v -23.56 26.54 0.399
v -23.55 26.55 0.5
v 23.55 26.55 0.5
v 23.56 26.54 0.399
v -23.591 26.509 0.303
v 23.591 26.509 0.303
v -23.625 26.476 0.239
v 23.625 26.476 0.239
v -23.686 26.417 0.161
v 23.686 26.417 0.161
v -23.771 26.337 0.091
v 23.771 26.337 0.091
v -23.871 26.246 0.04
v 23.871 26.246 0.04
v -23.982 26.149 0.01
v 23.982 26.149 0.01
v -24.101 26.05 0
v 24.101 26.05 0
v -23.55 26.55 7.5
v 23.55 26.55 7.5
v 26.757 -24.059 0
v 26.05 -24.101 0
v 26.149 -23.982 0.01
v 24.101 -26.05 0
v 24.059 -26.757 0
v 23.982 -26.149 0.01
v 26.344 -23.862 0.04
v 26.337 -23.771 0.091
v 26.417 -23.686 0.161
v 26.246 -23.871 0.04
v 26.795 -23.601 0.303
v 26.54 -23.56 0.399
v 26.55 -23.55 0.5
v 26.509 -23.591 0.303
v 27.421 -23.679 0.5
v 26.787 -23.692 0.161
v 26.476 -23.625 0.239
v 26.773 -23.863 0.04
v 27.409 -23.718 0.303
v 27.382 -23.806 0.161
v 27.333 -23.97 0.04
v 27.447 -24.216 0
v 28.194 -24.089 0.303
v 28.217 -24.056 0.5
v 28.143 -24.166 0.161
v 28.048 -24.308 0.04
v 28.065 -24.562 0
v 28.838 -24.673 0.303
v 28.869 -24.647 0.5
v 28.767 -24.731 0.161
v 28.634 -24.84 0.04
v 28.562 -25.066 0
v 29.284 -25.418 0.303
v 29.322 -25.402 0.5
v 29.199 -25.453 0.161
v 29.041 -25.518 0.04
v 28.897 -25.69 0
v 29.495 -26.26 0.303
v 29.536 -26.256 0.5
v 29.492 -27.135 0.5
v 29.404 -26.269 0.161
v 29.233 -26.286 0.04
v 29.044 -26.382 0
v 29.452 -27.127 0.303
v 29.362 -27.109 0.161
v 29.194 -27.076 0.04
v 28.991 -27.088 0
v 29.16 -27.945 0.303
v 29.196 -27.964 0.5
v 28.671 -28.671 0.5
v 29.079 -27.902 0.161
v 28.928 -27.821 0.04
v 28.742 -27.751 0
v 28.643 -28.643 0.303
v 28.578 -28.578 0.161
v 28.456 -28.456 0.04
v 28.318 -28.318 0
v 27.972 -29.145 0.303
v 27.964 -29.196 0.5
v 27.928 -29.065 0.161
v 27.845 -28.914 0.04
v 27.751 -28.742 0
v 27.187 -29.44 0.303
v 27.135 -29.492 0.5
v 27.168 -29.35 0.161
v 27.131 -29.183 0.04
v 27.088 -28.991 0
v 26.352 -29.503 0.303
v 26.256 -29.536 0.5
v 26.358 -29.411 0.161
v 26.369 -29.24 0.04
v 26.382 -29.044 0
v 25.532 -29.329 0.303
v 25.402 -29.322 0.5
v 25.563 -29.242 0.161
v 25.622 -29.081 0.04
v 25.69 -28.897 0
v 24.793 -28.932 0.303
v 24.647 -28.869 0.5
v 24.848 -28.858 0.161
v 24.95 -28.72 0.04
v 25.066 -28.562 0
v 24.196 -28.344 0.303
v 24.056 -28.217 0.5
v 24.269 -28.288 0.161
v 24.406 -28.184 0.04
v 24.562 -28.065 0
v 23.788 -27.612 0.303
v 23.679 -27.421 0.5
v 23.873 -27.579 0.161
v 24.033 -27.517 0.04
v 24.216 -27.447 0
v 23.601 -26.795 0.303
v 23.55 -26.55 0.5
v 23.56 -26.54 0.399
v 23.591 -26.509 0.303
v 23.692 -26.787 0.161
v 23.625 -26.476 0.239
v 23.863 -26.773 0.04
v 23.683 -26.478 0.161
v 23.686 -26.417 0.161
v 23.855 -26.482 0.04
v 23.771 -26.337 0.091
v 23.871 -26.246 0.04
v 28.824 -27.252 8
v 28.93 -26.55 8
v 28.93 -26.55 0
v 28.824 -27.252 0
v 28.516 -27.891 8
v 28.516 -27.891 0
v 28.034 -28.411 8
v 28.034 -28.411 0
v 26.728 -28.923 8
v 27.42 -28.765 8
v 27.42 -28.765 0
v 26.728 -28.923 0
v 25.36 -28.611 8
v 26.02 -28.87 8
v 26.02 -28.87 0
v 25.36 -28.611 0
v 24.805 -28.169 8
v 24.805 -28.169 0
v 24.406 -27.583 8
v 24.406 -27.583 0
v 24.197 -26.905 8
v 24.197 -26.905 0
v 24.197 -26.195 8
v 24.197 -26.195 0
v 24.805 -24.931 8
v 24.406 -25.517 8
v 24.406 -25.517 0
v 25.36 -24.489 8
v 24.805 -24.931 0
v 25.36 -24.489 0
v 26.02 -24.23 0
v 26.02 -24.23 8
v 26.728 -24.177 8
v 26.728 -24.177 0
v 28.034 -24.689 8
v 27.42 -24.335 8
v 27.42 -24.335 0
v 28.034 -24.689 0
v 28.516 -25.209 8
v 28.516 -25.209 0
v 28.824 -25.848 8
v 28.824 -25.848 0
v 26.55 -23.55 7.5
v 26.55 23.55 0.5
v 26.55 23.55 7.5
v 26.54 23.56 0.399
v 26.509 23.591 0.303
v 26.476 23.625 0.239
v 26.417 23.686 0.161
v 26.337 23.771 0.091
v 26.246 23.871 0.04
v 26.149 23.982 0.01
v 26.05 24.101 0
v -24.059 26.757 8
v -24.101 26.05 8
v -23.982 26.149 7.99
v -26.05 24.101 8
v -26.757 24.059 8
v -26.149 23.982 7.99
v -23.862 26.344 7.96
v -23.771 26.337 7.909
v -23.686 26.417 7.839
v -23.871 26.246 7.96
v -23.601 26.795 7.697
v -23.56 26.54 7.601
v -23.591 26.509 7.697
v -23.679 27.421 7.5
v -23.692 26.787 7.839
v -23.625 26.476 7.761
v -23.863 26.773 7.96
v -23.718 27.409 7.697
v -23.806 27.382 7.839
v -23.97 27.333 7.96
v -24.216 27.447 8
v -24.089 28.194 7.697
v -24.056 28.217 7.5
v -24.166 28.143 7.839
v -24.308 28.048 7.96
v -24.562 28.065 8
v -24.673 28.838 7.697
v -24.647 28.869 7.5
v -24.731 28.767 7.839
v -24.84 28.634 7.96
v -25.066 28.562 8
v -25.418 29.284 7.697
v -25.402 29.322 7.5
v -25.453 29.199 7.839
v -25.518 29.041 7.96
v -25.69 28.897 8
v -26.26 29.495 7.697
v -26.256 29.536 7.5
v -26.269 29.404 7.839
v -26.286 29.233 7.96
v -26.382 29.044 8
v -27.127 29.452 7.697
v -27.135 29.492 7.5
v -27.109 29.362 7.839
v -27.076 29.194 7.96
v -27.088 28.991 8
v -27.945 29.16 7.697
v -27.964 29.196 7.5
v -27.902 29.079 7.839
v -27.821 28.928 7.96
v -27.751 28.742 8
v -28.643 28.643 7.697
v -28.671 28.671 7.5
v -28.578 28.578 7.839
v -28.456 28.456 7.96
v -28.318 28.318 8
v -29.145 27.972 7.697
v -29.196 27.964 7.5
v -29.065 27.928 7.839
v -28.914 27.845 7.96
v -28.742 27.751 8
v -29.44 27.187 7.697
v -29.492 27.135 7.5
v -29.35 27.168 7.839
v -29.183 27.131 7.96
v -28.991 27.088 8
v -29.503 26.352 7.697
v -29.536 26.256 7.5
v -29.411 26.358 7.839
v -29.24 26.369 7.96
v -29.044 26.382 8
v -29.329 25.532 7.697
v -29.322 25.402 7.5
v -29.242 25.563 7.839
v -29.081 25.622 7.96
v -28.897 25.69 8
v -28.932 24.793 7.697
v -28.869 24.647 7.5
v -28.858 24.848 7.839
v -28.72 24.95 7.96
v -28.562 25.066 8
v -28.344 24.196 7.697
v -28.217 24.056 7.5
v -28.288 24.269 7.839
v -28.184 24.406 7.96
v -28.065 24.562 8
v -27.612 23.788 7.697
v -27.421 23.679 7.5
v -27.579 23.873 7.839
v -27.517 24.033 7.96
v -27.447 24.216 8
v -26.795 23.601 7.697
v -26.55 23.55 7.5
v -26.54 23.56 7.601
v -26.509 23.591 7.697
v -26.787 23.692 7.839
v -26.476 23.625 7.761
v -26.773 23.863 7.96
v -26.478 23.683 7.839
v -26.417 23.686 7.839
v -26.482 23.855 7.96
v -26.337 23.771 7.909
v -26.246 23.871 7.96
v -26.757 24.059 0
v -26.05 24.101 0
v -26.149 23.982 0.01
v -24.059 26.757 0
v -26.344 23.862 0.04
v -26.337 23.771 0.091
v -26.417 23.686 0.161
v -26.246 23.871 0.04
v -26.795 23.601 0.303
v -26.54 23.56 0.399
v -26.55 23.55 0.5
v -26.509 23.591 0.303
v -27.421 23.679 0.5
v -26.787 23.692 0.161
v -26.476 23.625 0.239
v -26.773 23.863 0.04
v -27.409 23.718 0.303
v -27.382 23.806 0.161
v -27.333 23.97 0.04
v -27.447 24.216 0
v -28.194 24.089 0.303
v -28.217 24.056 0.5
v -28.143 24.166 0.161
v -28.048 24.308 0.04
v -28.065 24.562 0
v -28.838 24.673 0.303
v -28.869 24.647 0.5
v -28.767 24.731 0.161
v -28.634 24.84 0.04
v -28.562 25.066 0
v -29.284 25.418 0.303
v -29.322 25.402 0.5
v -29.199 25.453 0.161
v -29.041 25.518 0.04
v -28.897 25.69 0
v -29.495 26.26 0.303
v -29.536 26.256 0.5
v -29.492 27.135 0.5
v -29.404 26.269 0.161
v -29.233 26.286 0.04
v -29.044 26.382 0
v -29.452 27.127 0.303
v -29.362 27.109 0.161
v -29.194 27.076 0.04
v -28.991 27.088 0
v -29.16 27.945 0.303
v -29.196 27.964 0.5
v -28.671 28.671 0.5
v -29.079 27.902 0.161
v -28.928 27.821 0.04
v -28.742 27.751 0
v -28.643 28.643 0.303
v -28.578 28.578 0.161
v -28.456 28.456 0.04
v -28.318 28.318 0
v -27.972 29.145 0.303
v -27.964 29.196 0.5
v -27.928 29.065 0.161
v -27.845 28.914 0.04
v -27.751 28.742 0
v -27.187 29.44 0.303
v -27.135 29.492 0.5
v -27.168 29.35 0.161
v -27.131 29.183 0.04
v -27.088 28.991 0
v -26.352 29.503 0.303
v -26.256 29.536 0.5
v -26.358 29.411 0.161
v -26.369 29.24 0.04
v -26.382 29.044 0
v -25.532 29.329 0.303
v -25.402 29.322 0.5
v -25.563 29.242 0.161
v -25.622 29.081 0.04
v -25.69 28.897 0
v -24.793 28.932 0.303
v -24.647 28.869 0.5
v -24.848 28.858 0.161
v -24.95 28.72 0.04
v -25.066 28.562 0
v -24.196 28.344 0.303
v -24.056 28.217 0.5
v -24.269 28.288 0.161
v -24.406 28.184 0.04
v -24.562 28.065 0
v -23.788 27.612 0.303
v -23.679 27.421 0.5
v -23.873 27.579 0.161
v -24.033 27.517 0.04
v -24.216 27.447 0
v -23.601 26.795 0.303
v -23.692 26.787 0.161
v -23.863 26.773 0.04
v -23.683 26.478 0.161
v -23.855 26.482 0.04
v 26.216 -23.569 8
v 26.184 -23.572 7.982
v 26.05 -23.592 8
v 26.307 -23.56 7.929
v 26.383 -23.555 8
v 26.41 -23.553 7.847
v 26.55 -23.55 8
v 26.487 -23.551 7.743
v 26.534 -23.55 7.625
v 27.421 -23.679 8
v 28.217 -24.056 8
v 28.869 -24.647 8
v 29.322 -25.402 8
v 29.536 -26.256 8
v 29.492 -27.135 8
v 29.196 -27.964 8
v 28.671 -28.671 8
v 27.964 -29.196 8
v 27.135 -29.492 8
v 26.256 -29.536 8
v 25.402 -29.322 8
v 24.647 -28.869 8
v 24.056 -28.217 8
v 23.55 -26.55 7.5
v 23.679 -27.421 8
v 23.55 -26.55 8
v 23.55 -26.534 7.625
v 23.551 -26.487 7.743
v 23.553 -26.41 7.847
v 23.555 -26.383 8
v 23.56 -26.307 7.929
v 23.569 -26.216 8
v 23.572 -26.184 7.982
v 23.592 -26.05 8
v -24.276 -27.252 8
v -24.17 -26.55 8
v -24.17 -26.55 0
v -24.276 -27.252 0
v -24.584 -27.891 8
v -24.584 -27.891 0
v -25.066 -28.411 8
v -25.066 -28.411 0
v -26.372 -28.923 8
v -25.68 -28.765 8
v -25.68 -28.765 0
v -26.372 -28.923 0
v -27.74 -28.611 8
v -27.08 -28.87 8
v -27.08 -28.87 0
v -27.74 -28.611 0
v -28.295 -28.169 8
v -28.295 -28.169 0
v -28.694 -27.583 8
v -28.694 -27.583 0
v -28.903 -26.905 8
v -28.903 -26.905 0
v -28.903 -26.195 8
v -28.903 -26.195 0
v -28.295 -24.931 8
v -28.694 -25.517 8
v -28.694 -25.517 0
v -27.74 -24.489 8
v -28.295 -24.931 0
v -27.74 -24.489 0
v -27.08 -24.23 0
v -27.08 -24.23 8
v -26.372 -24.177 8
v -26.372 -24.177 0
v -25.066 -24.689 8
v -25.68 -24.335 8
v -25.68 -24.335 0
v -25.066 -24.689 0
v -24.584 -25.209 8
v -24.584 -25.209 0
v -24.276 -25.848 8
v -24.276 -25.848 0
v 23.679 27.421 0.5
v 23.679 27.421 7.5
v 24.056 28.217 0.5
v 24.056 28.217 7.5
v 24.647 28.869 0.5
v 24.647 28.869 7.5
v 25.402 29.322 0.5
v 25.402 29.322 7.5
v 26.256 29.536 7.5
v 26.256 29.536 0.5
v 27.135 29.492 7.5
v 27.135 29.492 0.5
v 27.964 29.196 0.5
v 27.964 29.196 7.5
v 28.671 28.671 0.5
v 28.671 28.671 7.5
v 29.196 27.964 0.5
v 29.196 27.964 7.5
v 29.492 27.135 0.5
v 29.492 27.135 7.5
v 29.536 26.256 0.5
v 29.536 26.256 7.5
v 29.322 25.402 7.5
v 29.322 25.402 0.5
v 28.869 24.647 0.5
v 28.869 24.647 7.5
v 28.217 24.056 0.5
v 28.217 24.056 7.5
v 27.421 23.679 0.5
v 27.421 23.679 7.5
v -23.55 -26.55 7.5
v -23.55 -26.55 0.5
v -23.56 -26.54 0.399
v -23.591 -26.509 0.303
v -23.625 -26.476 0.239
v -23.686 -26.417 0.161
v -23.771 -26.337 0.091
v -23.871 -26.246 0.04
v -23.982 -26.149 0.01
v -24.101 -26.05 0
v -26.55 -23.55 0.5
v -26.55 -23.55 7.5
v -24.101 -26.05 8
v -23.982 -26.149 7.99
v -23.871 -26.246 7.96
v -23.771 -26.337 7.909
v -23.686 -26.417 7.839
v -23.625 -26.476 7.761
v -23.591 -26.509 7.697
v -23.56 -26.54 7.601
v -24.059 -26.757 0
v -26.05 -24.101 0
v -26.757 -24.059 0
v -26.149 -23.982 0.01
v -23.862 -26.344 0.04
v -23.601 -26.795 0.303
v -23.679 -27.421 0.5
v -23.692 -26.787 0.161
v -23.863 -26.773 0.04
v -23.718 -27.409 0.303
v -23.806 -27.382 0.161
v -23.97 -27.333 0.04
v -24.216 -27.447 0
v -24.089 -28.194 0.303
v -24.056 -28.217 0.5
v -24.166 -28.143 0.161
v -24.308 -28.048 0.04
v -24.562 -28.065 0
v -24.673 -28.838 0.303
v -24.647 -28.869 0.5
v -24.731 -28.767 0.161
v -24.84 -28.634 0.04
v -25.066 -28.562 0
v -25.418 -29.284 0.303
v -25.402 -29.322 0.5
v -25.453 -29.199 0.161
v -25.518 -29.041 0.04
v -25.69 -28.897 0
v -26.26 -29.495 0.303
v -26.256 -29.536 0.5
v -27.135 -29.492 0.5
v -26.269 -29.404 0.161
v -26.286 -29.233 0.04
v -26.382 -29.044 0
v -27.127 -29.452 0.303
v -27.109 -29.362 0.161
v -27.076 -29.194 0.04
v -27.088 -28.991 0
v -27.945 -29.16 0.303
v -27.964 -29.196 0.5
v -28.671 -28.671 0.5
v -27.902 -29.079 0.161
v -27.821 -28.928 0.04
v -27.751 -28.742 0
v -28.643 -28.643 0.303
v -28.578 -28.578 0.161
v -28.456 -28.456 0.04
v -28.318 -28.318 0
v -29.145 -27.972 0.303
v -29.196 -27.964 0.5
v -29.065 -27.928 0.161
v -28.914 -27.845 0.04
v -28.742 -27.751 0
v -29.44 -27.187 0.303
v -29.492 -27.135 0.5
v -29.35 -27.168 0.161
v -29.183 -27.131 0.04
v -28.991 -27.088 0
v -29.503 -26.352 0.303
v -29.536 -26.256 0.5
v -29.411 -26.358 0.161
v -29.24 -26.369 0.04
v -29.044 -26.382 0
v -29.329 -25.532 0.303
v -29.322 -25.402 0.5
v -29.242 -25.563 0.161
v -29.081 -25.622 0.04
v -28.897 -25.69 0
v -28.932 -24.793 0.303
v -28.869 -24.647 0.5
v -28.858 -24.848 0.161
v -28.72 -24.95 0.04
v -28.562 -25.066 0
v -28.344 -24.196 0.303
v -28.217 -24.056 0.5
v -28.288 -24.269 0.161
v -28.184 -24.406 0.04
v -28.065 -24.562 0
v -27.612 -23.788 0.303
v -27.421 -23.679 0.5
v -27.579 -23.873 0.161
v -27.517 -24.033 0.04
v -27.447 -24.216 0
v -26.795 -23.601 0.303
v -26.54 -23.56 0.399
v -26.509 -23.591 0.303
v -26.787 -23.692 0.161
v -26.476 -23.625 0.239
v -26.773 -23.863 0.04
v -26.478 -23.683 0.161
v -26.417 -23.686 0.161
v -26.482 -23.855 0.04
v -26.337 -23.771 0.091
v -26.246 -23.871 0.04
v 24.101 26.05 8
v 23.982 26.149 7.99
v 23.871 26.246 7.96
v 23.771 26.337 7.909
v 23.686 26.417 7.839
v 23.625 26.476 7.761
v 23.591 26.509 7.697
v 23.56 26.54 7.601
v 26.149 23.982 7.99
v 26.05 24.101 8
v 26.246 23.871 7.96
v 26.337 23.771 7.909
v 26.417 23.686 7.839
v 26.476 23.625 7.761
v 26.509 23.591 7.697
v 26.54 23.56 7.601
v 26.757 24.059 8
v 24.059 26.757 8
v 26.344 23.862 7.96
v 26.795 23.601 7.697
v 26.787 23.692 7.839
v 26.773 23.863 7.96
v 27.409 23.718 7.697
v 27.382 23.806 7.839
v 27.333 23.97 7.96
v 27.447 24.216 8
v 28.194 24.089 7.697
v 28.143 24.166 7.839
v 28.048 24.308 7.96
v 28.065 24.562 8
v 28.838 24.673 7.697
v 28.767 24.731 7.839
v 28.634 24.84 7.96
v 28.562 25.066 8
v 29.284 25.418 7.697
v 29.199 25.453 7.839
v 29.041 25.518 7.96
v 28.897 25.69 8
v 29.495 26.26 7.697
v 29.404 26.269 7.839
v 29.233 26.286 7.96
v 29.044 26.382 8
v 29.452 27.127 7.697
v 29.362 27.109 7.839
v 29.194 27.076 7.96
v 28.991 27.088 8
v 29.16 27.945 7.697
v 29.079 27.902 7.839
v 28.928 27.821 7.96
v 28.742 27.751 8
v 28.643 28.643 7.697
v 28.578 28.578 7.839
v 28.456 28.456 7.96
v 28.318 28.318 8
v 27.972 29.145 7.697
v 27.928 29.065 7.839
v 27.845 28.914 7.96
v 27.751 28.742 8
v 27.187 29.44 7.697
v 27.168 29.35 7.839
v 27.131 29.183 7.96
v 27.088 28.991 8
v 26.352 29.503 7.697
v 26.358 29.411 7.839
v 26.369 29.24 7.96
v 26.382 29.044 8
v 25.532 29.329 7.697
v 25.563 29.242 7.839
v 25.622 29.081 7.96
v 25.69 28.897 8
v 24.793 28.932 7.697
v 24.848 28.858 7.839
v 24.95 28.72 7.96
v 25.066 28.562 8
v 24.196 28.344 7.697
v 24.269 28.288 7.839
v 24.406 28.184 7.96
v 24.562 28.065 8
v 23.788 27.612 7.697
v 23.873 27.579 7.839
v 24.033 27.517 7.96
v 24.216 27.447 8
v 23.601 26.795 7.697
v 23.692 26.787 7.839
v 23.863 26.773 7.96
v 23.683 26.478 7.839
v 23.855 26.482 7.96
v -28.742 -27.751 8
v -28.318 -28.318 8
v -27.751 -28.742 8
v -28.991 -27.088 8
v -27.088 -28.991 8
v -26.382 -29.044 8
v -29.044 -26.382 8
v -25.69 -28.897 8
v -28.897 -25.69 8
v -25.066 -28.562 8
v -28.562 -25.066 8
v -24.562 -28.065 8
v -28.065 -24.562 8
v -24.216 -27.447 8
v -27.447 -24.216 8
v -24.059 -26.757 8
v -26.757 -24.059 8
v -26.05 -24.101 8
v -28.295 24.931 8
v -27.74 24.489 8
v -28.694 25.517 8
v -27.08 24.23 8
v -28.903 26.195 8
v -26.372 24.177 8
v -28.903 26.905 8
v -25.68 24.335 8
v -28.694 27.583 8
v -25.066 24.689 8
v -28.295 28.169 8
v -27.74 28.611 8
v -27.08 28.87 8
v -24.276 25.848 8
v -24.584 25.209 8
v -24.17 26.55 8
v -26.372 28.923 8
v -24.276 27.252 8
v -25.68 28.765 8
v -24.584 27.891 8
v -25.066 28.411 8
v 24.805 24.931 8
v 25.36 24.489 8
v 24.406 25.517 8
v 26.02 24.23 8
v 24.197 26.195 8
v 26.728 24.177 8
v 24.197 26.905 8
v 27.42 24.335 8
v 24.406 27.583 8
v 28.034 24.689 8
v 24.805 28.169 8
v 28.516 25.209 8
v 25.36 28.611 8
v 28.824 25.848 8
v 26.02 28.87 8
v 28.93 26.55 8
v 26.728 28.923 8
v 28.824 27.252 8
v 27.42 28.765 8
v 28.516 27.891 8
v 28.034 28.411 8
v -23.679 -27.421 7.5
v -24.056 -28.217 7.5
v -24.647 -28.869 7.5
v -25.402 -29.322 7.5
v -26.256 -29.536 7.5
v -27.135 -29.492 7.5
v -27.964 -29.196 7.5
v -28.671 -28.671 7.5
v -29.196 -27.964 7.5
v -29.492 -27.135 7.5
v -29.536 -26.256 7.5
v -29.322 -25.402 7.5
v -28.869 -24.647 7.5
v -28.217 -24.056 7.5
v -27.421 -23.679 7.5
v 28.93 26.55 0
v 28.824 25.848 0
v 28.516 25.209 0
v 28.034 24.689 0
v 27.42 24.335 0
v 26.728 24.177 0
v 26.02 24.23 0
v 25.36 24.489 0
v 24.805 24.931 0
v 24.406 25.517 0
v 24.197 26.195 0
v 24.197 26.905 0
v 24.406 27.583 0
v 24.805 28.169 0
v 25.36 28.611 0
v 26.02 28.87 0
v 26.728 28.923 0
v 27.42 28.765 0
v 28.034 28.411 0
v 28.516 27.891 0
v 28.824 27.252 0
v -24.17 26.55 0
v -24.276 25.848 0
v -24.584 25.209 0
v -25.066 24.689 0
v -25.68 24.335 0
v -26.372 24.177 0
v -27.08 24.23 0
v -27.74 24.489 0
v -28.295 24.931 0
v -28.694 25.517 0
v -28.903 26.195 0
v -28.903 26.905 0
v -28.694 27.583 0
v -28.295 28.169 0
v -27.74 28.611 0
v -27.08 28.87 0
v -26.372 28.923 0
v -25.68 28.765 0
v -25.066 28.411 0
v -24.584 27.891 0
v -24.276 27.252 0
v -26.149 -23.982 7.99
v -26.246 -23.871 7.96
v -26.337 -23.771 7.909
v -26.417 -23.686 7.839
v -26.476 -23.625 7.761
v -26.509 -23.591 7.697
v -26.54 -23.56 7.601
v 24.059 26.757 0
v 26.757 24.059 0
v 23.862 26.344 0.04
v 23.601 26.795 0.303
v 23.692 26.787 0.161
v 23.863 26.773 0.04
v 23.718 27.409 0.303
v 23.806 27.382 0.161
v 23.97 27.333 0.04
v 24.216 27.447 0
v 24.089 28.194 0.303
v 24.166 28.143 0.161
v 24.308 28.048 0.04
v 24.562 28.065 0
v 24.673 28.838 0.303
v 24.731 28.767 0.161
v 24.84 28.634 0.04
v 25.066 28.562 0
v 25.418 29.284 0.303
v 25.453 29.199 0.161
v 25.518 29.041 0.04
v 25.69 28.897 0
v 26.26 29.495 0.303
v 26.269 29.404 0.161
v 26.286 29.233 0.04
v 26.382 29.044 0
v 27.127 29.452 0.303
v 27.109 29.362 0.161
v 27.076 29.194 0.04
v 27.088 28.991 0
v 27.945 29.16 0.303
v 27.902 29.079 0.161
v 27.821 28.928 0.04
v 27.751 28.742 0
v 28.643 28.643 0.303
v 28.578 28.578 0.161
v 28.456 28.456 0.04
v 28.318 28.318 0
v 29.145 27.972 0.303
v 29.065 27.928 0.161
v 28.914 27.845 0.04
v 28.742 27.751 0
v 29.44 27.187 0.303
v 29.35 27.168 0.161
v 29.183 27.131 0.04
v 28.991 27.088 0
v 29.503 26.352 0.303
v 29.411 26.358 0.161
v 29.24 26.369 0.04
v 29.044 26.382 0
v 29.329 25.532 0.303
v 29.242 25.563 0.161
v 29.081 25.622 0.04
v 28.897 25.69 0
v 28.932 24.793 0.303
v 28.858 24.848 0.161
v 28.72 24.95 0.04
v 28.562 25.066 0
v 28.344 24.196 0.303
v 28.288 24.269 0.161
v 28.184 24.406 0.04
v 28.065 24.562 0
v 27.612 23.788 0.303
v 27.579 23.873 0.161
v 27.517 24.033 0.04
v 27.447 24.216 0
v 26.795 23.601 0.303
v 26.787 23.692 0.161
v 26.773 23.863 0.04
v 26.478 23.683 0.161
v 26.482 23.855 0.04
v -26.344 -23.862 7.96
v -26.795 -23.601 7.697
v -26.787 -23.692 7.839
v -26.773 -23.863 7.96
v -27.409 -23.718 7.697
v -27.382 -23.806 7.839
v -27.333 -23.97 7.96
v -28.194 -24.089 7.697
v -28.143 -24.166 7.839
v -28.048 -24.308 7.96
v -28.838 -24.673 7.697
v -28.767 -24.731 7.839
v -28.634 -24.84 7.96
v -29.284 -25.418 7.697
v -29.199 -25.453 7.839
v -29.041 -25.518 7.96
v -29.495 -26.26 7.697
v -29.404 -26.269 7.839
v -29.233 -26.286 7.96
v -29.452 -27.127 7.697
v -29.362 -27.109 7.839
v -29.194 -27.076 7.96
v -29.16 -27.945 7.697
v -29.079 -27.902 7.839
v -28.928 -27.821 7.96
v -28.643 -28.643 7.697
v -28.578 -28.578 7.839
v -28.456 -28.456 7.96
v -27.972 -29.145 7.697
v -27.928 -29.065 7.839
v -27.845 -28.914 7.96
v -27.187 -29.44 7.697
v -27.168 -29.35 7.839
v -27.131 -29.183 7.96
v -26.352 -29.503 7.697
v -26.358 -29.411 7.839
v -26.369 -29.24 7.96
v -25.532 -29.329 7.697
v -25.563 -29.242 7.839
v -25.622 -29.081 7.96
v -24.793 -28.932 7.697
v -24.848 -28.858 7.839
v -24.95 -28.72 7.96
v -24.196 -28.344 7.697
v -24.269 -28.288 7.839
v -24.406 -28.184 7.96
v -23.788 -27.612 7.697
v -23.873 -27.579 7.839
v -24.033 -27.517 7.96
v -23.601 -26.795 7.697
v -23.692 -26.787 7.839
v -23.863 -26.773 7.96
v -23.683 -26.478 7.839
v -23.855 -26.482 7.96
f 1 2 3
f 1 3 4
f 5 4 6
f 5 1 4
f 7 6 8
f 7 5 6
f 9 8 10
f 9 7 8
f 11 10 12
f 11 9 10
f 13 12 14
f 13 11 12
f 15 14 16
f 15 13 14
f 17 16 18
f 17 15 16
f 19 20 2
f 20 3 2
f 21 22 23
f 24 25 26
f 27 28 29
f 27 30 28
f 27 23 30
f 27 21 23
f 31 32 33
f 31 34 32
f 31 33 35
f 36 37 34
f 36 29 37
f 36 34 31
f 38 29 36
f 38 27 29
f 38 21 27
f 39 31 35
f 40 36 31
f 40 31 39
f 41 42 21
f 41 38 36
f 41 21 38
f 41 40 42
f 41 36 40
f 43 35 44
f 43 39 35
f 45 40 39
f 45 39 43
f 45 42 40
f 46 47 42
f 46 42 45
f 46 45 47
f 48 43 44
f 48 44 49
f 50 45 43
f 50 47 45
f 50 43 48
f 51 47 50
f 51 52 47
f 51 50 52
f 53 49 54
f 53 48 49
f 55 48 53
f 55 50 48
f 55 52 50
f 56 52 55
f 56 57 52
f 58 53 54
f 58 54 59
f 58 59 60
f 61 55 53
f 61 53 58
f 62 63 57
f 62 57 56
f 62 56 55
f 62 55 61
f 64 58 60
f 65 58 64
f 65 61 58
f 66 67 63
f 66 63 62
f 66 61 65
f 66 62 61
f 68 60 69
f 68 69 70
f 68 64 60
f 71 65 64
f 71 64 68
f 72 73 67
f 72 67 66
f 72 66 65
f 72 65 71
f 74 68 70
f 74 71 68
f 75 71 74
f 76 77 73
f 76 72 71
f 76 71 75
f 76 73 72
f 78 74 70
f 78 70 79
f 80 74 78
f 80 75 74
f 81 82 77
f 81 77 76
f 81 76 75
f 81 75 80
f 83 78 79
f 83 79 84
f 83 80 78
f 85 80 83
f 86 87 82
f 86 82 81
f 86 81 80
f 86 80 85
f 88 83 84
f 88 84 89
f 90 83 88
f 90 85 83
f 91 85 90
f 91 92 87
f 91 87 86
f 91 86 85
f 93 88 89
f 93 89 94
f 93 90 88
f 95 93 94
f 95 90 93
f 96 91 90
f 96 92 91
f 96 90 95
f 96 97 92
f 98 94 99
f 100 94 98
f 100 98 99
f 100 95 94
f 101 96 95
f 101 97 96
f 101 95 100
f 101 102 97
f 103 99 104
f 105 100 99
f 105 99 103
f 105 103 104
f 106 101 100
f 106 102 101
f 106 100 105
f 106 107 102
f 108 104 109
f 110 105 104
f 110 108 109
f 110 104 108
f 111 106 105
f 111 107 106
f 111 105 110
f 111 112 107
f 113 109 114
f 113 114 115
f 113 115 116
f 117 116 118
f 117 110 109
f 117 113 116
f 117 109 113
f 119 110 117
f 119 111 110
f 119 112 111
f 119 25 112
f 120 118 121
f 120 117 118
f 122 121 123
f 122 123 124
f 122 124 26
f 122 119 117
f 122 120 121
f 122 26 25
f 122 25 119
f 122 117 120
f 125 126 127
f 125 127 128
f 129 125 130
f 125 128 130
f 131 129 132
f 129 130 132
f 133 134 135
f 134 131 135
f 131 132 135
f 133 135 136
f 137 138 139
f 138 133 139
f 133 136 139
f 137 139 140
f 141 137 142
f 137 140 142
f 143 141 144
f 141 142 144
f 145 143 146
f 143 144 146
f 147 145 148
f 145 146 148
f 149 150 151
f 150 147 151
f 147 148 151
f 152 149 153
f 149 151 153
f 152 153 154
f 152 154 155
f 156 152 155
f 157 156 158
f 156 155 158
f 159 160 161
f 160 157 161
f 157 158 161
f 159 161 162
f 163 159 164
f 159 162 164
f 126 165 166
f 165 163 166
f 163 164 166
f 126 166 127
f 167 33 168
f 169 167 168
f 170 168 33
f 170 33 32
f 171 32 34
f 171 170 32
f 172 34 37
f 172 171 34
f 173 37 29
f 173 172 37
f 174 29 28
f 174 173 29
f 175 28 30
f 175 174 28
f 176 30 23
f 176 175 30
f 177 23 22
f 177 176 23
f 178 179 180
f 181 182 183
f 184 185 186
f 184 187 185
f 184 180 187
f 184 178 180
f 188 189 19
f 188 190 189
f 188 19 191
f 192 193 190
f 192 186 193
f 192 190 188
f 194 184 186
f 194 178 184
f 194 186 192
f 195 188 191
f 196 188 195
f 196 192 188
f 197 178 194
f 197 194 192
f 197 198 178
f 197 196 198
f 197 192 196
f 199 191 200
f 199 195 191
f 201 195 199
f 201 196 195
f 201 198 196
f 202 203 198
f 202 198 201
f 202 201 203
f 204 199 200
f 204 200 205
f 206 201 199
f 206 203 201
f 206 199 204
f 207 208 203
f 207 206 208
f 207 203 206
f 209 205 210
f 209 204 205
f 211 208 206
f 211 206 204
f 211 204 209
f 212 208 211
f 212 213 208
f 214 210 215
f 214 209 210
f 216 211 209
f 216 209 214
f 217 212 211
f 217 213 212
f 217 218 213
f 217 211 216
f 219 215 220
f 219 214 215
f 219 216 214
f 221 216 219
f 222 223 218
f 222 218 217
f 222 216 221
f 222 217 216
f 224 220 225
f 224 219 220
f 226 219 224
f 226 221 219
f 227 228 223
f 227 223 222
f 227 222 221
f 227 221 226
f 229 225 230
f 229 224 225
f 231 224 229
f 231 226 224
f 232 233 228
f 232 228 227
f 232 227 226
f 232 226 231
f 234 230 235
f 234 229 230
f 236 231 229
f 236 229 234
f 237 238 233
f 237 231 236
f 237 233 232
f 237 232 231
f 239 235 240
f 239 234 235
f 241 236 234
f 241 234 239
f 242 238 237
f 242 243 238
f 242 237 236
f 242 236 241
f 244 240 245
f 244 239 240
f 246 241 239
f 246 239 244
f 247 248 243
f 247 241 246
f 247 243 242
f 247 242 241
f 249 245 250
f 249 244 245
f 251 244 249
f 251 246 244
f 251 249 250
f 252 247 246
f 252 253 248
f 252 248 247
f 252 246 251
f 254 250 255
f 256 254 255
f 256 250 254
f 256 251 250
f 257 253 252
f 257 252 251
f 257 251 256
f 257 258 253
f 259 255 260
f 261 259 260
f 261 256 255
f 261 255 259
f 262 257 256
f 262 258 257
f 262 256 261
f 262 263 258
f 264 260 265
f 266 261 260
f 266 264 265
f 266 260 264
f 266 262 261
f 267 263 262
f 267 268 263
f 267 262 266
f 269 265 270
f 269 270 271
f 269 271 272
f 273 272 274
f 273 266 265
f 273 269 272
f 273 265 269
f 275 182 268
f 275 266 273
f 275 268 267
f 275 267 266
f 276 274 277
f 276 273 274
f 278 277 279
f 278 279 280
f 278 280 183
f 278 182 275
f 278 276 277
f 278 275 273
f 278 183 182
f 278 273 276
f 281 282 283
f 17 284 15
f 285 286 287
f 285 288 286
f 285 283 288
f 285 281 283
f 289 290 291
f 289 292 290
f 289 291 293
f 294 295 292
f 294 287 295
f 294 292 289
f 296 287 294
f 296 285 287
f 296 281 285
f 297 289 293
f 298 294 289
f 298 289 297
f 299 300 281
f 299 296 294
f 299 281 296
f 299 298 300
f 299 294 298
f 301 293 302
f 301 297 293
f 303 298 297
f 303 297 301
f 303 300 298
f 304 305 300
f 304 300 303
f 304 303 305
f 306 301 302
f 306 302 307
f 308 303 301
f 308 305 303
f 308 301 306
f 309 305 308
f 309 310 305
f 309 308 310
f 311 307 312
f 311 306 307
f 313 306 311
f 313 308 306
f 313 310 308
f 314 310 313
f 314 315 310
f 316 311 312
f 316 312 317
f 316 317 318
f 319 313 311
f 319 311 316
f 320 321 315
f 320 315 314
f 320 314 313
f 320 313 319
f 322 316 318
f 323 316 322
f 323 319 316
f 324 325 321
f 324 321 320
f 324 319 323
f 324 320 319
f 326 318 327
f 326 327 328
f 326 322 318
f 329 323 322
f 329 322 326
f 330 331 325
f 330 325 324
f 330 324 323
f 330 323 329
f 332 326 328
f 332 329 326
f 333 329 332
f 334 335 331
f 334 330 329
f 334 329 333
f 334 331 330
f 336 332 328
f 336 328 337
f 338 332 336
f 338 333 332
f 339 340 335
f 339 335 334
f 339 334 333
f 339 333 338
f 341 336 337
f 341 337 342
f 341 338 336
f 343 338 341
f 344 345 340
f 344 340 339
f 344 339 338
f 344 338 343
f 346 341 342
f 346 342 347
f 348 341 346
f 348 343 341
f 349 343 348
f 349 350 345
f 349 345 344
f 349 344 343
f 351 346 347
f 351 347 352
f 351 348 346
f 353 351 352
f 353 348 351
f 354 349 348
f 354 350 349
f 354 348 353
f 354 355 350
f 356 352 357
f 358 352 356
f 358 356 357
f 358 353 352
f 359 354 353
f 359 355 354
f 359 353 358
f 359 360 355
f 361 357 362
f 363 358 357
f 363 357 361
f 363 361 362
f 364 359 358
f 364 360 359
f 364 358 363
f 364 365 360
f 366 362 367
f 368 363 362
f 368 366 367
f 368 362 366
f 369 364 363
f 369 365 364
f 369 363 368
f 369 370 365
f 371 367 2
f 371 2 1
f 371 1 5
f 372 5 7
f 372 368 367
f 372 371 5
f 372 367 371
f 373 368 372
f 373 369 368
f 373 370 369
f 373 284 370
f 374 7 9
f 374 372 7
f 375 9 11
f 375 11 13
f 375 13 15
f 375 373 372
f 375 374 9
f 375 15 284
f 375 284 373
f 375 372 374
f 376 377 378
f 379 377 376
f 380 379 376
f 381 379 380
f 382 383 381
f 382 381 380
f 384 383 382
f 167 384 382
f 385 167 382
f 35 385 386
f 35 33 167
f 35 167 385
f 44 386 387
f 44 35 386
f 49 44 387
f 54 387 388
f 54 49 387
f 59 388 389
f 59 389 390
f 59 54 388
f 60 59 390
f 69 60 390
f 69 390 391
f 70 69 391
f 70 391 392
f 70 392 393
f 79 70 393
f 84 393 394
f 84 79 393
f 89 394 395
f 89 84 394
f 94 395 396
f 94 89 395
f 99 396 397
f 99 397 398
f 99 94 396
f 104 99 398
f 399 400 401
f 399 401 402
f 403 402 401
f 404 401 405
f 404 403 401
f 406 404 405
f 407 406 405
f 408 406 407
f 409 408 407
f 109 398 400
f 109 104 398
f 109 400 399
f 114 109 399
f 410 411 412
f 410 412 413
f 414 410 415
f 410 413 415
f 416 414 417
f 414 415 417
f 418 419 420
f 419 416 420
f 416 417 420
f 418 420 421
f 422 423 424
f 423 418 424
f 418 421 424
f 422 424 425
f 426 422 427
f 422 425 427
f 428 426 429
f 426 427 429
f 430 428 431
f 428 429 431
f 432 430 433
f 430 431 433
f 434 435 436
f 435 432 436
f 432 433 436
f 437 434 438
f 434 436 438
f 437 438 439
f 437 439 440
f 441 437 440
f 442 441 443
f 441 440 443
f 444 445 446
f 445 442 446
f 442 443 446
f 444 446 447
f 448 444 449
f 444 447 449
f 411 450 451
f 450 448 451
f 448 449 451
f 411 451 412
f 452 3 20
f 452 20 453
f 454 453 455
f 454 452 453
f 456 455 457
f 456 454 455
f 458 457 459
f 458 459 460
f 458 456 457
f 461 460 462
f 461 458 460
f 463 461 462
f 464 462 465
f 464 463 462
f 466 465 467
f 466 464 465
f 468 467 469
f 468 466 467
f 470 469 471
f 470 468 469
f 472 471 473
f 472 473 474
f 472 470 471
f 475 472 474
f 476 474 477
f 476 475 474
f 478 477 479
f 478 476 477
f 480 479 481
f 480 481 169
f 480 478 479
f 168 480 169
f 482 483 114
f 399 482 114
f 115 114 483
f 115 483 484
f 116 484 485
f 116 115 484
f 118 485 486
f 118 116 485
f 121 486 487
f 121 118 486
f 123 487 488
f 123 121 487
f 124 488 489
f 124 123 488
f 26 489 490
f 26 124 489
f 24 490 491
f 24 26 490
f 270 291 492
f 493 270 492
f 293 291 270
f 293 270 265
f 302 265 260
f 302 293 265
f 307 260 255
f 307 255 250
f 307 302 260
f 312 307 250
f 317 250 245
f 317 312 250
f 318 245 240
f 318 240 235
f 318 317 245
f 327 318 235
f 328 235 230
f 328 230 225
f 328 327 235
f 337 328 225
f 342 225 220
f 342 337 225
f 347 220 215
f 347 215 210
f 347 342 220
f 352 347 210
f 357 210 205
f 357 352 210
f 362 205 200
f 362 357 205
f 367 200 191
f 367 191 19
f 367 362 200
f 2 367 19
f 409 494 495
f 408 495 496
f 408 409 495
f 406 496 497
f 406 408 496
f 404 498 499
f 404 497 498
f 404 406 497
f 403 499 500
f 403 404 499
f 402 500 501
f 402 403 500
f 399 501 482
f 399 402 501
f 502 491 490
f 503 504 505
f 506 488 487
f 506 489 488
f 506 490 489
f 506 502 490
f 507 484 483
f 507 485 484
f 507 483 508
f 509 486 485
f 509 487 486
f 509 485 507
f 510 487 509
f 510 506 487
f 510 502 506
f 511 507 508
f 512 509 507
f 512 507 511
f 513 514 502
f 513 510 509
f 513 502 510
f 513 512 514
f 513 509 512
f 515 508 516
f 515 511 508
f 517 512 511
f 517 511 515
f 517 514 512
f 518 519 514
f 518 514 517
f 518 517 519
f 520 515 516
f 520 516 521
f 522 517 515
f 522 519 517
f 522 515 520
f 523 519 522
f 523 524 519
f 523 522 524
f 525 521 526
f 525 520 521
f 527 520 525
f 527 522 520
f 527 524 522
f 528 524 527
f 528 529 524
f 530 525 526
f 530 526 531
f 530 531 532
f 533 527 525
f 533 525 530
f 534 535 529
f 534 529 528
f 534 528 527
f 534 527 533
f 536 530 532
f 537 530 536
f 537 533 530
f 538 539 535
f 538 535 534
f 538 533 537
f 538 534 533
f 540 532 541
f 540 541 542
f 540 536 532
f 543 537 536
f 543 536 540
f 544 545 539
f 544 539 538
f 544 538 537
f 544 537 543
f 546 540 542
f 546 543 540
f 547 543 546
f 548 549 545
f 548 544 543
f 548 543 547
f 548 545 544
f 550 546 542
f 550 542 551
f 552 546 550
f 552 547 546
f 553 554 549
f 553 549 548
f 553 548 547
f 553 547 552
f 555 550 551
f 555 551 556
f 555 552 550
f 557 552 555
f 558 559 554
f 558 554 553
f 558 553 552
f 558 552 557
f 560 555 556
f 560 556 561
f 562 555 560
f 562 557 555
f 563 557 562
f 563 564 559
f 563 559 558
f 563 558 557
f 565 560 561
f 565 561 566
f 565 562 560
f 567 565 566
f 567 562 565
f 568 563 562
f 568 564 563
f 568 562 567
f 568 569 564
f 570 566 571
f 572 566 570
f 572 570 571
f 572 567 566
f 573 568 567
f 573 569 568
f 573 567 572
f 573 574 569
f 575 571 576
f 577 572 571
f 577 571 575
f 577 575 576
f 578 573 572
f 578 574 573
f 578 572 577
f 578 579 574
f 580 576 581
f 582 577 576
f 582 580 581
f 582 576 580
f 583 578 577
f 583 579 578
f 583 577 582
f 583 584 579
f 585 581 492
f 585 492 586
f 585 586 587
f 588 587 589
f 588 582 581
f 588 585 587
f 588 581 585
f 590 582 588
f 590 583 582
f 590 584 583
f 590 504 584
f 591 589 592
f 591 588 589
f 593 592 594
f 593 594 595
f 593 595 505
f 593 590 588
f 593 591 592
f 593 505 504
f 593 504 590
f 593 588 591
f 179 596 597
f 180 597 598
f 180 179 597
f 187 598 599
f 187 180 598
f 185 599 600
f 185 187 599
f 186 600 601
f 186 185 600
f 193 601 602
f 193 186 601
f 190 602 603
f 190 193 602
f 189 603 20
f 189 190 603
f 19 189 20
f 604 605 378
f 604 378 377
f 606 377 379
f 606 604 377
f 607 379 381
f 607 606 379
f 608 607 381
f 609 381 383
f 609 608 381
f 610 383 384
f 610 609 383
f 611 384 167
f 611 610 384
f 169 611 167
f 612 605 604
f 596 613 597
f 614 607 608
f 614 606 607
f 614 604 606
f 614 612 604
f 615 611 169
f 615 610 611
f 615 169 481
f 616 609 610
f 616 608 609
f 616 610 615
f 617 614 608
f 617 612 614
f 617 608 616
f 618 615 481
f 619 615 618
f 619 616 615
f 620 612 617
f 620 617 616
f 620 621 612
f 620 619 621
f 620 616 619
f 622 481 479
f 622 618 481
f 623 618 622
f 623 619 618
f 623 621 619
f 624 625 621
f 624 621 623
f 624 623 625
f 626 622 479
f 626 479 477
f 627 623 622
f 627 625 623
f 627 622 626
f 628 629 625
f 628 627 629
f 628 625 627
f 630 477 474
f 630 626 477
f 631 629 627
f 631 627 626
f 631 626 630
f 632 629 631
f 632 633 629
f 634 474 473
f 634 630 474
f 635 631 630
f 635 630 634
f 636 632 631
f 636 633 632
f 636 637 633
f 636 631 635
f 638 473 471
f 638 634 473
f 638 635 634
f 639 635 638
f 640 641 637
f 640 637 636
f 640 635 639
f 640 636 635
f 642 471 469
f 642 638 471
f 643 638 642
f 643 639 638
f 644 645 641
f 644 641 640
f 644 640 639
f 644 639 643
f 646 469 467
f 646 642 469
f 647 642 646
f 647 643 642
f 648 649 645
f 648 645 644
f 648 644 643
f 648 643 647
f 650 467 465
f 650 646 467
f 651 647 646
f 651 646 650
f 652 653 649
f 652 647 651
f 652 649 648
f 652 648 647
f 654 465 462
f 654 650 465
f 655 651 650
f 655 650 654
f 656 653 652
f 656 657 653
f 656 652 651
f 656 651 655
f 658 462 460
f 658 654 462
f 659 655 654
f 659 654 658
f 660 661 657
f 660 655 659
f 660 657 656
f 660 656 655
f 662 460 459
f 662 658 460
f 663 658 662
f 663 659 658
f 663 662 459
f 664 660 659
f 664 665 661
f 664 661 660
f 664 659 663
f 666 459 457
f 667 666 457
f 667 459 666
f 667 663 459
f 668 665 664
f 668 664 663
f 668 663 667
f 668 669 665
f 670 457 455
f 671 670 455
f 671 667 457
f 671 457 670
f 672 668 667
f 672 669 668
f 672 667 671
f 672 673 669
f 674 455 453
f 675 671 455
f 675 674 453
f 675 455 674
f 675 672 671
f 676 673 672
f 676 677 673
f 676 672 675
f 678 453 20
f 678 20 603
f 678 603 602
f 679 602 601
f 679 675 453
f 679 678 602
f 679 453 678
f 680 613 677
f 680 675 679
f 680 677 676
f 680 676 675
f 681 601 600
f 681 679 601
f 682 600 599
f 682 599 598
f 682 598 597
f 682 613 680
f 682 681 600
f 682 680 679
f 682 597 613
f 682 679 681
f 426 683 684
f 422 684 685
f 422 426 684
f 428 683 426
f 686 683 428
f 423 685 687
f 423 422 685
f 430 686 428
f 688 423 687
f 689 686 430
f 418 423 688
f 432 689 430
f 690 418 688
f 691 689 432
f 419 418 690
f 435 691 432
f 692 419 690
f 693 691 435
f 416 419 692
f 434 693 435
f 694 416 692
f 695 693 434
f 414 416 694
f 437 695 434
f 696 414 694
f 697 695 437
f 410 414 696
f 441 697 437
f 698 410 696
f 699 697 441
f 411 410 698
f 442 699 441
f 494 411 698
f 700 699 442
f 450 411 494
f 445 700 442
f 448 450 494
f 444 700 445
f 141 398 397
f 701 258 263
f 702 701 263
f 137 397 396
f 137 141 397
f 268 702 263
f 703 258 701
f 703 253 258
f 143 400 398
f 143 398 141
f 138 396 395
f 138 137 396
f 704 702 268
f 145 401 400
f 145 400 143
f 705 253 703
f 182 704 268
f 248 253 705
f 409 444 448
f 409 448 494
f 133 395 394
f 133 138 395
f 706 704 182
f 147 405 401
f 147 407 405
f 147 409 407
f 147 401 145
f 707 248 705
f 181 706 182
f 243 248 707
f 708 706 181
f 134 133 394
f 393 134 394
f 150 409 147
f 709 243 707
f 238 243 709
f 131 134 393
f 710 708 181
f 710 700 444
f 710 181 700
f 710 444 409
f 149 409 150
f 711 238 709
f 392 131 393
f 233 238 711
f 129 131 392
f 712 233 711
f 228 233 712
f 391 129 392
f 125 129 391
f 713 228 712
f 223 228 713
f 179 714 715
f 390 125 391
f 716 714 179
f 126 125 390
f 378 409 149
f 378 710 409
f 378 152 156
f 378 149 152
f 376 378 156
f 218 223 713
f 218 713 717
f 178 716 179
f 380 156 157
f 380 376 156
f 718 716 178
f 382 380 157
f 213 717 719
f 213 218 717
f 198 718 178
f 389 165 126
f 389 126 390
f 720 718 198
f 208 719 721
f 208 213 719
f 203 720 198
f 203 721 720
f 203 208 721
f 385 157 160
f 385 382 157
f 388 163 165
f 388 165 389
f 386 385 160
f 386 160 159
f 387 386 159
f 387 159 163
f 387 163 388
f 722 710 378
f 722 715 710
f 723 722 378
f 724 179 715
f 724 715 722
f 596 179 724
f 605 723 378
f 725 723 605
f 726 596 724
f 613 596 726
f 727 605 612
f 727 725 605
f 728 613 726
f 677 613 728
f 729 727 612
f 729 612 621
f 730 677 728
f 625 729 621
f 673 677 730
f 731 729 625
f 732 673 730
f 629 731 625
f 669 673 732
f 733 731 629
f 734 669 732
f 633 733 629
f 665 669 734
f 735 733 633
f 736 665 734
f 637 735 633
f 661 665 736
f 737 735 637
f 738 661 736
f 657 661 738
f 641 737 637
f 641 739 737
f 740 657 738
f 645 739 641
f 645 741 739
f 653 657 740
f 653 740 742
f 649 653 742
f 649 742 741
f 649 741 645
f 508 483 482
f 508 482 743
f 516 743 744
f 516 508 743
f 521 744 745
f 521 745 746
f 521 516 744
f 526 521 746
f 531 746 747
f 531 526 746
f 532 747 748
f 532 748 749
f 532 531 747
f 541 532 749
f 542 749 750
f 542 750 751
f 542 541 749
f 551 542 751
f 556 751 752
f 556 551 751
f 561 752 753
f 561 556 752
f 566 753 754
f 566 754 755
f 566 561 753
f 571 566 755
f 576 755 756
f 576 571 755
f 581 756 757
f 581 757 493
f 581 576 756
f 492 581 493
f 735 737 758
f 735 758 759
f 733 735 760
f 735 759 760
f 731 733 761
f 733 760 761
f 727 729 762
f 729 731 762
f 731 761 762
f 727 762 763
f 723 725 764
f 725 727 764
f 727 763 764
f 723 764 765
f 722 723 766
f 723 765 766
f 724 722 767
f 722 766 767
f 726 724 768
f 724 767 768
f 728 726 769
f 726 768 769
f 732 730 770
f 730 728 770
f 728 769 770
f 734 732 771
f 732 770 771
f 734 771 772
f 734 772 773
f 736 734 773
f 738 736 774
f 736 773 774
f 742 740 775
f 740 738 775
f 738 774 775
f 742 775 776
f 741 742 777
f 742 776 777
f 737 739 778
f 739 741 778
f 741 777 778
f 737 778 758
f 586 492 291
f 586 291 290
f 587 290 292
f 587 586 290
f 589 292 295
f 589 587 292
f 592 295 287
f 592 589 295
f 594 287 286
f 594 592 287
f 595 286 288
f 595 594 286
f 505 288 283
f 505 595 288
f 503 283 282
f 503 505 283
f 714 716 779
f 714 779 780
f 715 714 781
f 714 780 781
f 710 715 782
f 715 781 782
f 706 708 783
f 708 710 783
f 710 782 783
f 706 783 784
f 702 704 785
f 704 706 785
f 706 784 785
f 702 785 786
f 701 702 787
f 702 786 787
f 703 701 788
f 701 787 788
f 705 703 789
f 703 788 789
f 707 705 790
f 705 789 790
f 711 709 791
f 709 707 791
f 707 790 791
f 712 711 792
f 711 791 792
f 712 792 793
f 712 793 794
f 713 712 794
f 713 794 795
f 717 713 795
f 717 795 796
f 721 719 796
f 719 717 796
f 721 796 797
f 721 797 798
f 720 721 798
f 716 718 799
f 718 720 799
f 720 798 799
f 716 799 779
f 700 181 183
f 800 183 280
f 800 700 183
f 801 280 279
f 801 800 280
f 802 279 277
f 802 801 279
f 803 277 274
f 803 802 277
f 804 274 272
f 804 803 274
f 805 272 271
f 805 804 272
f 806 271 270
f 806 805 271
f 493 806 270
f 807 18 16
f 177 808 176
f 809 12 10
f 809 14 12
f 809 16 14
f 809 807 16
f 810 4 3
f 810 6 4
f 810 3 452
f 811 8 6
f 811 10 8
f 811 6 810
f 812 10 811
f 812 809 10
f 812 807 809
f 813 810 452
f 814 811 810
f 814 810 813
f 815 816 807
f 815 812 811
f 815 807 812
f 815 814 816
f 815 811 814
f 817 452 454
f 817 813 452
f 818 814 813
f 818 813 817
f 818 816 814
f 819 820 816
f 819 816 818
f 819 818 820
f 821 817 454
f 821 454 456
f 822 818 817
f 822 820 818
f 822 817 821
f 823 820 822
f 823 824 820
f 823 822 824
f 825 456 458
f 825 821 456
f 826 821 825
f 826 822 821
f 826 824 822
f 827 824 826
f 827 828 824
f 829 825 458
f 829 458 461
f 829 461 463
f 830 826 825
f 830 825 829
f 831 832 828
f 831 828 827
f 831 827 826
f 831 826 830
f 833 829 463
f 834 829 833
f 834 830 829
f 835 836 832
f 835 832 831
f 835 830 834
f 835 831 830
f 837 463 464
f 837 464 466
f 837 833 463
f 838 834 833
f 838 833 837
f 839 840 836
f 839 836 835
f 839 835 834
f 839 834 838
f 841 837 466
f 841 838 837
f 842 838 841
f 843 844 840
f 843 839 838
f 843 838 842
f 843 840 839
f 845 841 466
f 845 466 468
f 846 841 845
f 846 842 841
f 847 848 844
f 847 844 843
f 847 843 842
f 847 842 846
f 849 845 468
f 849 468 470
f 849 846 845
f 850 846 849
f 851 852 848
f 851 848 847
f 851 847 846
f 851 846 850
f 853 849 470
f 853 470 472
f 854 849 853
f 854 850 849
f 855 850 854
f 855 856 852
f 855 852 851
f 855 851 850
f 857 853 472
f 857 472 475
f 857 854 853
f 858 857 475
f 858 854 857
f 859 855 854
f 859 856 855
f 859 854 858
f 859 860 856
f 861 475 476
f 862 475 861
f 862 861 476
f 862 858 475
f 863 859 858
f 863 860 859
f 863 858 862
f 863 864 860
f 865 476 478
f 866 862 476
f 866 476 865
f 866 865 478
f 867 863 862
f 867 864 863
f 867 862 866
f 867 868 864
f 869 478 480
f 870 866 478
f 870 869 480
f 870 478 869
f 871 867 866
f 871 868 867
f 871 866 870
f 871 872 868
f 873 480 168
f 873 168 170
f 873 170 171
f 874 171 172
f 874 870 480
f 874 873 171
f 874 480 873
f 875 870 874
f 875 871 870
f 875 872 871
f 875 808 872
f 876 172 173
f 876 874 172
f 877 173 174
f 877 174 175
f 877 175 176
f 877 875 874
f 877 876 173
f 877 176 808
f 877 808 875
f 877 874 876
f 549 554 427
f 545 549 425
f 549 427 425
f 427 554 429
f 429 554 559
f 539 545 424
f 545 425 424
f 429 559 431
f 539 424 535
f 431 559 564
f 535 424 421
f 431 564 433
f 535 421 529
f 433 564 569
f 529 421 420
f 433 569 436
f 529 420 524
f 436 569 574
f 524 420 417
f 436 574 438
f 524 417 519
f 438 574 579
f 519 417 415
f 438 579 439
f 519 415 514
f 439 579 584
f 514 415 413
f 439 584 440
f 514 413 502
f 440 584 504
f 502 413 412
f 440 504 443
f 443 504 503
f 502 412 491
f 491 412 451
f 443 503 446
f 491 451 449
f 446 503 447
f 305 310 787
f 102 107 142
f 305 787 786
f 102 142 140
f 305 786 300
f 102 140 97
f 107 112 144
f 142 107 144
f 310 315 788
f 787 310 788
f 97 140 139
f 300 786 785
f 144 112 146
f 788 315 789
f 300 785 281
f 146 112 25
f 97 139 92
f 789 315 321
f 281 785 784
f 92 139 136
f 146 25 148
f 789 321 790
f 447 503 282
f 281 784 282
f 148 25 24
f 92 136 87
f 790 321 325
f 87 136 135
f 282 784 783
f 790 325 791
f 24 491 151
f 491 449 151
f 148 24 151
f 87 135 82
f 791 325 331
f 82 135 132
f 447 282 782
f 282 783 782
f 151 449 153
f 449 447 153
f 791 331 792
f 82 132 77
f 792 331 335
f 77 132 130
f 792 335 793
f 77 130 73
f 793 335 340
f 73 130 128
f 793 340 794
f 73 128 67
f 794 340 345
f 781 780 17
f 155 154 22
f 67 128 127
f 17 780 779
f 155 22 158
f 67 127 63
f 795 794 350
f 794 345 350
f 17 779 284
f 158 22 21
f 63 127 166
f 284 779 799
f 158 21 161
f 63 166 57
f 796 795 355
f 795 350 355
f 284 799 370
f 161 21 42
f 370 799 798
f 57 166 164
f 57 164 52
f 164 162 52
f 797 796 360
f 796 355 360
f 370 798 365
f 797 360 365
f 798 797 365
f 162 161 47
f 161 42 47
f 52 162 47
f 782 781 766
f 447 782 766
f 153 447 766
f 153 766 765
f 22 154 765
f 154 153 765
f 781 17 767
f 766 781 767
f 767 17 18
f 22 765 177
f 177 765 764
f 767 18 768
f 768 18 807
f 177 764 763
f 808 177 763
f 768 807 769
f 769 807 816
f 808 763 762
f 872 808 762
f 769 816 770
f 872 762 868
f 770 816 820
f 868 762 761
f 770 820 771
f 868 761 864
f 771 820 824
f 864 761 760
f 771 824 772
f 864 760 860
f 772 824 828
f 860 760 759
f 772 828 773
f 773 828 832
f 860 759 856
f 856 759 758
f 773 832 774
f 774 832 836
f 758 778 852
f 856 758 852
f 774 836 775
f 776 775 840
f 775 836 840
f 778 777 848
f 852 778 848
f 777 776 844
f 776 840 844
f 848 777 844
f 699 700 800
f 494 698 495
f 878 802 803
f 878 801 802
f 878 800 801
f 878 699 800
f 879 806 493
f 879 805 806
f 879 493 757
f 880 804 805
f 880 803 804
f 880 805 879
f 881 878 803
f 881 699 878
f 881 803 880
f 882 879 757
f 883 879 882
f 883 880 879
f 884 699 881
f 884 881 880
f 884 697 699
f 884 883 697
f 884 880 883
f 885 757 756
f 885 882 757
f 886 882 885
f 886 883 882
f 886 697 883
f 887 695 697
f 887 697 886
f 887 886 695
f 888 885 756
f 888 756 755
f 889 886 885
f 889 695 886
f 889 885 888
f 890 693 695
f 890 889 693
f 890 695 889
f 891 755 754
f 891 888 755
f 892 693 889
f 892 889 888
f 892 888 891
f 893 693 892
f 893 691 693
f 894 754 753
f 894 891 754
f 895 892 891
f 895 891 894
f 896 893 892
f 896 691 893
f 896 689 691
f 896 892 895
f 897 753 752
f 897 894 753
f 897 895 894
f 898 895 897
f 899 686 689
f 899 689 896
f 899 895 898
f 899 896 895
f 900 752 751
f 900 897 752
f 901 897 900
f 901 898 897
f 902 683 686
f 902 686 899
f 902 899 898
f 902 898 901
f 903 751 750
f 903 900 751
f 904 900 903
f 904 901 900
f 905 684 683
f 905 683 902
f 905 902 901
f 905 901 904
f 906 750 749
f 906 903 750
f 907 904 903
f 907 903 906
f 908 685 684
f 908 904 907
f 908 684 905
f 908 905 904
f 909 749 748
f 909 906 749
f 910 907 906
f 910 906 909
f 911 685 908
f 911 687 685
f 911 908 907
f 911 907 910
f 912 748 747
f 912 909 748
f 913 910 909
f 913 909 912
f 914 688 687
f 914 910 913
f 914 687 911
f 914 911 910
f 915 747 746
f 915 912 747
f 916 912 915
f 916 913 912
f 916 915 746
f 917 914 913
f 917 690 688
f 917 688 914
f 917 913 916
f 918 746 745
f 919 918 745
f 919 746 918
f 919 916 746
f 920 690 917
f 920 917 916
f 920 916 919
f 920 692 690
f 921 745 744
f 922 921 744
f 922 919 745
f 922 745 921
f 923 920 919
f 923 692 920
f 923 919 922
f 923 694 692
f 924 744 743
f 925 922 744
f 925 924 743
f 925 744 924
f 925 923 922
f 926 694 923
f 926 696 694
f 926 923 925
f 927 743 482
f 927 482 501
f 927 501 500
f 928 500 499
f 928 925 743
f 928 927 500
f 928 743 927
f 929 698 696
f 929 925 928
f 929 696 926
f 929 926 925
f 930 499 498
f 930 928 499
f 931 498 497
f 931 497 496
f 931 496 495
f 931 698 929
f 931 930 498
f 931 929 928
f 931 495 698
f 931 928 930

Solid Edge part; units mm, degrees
sketch "Sketch1" plane through (0, 0, 0) normal (0, 0, 1) x (1, 0, 0)
  line L0 (-26.55, 23.55) -> (-26.55, -23.55)
  line L1 (-23.55, -26.55) -> (23.55, -26.55)
  line L2 (26.55, -23.55) -> (26.55, 23.55)
  line L3 (23.55, 26.55) -> (-23.55, 26.55)
  arc A0 (-23.55, -26.55) -> (-26.55, -23.55) centre (-26.55, -26.55) cw
  arc A1 (26.55, -23.55) -> (23.55, -26.55) centre (26.55, -26.55) cw
  arc A2 (23.55, 26.55) -> (26.55, 23.55) centre (26.55, 26.55) cw
  arc A3 (-26.55, 23.55) -> (-23.55, 26.55) centre (-26.55, 26.55) cw
  circle A4 centre (-26.55, -26.55) radius 2.38
  circle A5 centre (-26.55, 26.55) radius 2.38
  circle A6 centre (26.55, -26.55) radius 2.38
  circle A7 centre (26.55, 26.55) radius 2.38
extrude "Protrusion1" add sketch "Sketch1" along normal blind 8
fillet "Round_1" radius 0.5 15 edges at (0, -26.55, 8) (-28.6713, -28.6713, 8) (-26.55, 0, 8) (-28.6713, 28.6713, 8) (0, 26.55, 8) (28.6713, 28.6713, 8) (26.55, 0, 8) (0, -26.55, 0) (-28.6713, -28.6713, 0) (-26.55, 0, 0) (28.6713, -28.6713, 0) (0, 26.55, 0) (-28.6713, 28.6713, 0) (28.6713, 28.6713, 0) (26.55, 0, 0)
